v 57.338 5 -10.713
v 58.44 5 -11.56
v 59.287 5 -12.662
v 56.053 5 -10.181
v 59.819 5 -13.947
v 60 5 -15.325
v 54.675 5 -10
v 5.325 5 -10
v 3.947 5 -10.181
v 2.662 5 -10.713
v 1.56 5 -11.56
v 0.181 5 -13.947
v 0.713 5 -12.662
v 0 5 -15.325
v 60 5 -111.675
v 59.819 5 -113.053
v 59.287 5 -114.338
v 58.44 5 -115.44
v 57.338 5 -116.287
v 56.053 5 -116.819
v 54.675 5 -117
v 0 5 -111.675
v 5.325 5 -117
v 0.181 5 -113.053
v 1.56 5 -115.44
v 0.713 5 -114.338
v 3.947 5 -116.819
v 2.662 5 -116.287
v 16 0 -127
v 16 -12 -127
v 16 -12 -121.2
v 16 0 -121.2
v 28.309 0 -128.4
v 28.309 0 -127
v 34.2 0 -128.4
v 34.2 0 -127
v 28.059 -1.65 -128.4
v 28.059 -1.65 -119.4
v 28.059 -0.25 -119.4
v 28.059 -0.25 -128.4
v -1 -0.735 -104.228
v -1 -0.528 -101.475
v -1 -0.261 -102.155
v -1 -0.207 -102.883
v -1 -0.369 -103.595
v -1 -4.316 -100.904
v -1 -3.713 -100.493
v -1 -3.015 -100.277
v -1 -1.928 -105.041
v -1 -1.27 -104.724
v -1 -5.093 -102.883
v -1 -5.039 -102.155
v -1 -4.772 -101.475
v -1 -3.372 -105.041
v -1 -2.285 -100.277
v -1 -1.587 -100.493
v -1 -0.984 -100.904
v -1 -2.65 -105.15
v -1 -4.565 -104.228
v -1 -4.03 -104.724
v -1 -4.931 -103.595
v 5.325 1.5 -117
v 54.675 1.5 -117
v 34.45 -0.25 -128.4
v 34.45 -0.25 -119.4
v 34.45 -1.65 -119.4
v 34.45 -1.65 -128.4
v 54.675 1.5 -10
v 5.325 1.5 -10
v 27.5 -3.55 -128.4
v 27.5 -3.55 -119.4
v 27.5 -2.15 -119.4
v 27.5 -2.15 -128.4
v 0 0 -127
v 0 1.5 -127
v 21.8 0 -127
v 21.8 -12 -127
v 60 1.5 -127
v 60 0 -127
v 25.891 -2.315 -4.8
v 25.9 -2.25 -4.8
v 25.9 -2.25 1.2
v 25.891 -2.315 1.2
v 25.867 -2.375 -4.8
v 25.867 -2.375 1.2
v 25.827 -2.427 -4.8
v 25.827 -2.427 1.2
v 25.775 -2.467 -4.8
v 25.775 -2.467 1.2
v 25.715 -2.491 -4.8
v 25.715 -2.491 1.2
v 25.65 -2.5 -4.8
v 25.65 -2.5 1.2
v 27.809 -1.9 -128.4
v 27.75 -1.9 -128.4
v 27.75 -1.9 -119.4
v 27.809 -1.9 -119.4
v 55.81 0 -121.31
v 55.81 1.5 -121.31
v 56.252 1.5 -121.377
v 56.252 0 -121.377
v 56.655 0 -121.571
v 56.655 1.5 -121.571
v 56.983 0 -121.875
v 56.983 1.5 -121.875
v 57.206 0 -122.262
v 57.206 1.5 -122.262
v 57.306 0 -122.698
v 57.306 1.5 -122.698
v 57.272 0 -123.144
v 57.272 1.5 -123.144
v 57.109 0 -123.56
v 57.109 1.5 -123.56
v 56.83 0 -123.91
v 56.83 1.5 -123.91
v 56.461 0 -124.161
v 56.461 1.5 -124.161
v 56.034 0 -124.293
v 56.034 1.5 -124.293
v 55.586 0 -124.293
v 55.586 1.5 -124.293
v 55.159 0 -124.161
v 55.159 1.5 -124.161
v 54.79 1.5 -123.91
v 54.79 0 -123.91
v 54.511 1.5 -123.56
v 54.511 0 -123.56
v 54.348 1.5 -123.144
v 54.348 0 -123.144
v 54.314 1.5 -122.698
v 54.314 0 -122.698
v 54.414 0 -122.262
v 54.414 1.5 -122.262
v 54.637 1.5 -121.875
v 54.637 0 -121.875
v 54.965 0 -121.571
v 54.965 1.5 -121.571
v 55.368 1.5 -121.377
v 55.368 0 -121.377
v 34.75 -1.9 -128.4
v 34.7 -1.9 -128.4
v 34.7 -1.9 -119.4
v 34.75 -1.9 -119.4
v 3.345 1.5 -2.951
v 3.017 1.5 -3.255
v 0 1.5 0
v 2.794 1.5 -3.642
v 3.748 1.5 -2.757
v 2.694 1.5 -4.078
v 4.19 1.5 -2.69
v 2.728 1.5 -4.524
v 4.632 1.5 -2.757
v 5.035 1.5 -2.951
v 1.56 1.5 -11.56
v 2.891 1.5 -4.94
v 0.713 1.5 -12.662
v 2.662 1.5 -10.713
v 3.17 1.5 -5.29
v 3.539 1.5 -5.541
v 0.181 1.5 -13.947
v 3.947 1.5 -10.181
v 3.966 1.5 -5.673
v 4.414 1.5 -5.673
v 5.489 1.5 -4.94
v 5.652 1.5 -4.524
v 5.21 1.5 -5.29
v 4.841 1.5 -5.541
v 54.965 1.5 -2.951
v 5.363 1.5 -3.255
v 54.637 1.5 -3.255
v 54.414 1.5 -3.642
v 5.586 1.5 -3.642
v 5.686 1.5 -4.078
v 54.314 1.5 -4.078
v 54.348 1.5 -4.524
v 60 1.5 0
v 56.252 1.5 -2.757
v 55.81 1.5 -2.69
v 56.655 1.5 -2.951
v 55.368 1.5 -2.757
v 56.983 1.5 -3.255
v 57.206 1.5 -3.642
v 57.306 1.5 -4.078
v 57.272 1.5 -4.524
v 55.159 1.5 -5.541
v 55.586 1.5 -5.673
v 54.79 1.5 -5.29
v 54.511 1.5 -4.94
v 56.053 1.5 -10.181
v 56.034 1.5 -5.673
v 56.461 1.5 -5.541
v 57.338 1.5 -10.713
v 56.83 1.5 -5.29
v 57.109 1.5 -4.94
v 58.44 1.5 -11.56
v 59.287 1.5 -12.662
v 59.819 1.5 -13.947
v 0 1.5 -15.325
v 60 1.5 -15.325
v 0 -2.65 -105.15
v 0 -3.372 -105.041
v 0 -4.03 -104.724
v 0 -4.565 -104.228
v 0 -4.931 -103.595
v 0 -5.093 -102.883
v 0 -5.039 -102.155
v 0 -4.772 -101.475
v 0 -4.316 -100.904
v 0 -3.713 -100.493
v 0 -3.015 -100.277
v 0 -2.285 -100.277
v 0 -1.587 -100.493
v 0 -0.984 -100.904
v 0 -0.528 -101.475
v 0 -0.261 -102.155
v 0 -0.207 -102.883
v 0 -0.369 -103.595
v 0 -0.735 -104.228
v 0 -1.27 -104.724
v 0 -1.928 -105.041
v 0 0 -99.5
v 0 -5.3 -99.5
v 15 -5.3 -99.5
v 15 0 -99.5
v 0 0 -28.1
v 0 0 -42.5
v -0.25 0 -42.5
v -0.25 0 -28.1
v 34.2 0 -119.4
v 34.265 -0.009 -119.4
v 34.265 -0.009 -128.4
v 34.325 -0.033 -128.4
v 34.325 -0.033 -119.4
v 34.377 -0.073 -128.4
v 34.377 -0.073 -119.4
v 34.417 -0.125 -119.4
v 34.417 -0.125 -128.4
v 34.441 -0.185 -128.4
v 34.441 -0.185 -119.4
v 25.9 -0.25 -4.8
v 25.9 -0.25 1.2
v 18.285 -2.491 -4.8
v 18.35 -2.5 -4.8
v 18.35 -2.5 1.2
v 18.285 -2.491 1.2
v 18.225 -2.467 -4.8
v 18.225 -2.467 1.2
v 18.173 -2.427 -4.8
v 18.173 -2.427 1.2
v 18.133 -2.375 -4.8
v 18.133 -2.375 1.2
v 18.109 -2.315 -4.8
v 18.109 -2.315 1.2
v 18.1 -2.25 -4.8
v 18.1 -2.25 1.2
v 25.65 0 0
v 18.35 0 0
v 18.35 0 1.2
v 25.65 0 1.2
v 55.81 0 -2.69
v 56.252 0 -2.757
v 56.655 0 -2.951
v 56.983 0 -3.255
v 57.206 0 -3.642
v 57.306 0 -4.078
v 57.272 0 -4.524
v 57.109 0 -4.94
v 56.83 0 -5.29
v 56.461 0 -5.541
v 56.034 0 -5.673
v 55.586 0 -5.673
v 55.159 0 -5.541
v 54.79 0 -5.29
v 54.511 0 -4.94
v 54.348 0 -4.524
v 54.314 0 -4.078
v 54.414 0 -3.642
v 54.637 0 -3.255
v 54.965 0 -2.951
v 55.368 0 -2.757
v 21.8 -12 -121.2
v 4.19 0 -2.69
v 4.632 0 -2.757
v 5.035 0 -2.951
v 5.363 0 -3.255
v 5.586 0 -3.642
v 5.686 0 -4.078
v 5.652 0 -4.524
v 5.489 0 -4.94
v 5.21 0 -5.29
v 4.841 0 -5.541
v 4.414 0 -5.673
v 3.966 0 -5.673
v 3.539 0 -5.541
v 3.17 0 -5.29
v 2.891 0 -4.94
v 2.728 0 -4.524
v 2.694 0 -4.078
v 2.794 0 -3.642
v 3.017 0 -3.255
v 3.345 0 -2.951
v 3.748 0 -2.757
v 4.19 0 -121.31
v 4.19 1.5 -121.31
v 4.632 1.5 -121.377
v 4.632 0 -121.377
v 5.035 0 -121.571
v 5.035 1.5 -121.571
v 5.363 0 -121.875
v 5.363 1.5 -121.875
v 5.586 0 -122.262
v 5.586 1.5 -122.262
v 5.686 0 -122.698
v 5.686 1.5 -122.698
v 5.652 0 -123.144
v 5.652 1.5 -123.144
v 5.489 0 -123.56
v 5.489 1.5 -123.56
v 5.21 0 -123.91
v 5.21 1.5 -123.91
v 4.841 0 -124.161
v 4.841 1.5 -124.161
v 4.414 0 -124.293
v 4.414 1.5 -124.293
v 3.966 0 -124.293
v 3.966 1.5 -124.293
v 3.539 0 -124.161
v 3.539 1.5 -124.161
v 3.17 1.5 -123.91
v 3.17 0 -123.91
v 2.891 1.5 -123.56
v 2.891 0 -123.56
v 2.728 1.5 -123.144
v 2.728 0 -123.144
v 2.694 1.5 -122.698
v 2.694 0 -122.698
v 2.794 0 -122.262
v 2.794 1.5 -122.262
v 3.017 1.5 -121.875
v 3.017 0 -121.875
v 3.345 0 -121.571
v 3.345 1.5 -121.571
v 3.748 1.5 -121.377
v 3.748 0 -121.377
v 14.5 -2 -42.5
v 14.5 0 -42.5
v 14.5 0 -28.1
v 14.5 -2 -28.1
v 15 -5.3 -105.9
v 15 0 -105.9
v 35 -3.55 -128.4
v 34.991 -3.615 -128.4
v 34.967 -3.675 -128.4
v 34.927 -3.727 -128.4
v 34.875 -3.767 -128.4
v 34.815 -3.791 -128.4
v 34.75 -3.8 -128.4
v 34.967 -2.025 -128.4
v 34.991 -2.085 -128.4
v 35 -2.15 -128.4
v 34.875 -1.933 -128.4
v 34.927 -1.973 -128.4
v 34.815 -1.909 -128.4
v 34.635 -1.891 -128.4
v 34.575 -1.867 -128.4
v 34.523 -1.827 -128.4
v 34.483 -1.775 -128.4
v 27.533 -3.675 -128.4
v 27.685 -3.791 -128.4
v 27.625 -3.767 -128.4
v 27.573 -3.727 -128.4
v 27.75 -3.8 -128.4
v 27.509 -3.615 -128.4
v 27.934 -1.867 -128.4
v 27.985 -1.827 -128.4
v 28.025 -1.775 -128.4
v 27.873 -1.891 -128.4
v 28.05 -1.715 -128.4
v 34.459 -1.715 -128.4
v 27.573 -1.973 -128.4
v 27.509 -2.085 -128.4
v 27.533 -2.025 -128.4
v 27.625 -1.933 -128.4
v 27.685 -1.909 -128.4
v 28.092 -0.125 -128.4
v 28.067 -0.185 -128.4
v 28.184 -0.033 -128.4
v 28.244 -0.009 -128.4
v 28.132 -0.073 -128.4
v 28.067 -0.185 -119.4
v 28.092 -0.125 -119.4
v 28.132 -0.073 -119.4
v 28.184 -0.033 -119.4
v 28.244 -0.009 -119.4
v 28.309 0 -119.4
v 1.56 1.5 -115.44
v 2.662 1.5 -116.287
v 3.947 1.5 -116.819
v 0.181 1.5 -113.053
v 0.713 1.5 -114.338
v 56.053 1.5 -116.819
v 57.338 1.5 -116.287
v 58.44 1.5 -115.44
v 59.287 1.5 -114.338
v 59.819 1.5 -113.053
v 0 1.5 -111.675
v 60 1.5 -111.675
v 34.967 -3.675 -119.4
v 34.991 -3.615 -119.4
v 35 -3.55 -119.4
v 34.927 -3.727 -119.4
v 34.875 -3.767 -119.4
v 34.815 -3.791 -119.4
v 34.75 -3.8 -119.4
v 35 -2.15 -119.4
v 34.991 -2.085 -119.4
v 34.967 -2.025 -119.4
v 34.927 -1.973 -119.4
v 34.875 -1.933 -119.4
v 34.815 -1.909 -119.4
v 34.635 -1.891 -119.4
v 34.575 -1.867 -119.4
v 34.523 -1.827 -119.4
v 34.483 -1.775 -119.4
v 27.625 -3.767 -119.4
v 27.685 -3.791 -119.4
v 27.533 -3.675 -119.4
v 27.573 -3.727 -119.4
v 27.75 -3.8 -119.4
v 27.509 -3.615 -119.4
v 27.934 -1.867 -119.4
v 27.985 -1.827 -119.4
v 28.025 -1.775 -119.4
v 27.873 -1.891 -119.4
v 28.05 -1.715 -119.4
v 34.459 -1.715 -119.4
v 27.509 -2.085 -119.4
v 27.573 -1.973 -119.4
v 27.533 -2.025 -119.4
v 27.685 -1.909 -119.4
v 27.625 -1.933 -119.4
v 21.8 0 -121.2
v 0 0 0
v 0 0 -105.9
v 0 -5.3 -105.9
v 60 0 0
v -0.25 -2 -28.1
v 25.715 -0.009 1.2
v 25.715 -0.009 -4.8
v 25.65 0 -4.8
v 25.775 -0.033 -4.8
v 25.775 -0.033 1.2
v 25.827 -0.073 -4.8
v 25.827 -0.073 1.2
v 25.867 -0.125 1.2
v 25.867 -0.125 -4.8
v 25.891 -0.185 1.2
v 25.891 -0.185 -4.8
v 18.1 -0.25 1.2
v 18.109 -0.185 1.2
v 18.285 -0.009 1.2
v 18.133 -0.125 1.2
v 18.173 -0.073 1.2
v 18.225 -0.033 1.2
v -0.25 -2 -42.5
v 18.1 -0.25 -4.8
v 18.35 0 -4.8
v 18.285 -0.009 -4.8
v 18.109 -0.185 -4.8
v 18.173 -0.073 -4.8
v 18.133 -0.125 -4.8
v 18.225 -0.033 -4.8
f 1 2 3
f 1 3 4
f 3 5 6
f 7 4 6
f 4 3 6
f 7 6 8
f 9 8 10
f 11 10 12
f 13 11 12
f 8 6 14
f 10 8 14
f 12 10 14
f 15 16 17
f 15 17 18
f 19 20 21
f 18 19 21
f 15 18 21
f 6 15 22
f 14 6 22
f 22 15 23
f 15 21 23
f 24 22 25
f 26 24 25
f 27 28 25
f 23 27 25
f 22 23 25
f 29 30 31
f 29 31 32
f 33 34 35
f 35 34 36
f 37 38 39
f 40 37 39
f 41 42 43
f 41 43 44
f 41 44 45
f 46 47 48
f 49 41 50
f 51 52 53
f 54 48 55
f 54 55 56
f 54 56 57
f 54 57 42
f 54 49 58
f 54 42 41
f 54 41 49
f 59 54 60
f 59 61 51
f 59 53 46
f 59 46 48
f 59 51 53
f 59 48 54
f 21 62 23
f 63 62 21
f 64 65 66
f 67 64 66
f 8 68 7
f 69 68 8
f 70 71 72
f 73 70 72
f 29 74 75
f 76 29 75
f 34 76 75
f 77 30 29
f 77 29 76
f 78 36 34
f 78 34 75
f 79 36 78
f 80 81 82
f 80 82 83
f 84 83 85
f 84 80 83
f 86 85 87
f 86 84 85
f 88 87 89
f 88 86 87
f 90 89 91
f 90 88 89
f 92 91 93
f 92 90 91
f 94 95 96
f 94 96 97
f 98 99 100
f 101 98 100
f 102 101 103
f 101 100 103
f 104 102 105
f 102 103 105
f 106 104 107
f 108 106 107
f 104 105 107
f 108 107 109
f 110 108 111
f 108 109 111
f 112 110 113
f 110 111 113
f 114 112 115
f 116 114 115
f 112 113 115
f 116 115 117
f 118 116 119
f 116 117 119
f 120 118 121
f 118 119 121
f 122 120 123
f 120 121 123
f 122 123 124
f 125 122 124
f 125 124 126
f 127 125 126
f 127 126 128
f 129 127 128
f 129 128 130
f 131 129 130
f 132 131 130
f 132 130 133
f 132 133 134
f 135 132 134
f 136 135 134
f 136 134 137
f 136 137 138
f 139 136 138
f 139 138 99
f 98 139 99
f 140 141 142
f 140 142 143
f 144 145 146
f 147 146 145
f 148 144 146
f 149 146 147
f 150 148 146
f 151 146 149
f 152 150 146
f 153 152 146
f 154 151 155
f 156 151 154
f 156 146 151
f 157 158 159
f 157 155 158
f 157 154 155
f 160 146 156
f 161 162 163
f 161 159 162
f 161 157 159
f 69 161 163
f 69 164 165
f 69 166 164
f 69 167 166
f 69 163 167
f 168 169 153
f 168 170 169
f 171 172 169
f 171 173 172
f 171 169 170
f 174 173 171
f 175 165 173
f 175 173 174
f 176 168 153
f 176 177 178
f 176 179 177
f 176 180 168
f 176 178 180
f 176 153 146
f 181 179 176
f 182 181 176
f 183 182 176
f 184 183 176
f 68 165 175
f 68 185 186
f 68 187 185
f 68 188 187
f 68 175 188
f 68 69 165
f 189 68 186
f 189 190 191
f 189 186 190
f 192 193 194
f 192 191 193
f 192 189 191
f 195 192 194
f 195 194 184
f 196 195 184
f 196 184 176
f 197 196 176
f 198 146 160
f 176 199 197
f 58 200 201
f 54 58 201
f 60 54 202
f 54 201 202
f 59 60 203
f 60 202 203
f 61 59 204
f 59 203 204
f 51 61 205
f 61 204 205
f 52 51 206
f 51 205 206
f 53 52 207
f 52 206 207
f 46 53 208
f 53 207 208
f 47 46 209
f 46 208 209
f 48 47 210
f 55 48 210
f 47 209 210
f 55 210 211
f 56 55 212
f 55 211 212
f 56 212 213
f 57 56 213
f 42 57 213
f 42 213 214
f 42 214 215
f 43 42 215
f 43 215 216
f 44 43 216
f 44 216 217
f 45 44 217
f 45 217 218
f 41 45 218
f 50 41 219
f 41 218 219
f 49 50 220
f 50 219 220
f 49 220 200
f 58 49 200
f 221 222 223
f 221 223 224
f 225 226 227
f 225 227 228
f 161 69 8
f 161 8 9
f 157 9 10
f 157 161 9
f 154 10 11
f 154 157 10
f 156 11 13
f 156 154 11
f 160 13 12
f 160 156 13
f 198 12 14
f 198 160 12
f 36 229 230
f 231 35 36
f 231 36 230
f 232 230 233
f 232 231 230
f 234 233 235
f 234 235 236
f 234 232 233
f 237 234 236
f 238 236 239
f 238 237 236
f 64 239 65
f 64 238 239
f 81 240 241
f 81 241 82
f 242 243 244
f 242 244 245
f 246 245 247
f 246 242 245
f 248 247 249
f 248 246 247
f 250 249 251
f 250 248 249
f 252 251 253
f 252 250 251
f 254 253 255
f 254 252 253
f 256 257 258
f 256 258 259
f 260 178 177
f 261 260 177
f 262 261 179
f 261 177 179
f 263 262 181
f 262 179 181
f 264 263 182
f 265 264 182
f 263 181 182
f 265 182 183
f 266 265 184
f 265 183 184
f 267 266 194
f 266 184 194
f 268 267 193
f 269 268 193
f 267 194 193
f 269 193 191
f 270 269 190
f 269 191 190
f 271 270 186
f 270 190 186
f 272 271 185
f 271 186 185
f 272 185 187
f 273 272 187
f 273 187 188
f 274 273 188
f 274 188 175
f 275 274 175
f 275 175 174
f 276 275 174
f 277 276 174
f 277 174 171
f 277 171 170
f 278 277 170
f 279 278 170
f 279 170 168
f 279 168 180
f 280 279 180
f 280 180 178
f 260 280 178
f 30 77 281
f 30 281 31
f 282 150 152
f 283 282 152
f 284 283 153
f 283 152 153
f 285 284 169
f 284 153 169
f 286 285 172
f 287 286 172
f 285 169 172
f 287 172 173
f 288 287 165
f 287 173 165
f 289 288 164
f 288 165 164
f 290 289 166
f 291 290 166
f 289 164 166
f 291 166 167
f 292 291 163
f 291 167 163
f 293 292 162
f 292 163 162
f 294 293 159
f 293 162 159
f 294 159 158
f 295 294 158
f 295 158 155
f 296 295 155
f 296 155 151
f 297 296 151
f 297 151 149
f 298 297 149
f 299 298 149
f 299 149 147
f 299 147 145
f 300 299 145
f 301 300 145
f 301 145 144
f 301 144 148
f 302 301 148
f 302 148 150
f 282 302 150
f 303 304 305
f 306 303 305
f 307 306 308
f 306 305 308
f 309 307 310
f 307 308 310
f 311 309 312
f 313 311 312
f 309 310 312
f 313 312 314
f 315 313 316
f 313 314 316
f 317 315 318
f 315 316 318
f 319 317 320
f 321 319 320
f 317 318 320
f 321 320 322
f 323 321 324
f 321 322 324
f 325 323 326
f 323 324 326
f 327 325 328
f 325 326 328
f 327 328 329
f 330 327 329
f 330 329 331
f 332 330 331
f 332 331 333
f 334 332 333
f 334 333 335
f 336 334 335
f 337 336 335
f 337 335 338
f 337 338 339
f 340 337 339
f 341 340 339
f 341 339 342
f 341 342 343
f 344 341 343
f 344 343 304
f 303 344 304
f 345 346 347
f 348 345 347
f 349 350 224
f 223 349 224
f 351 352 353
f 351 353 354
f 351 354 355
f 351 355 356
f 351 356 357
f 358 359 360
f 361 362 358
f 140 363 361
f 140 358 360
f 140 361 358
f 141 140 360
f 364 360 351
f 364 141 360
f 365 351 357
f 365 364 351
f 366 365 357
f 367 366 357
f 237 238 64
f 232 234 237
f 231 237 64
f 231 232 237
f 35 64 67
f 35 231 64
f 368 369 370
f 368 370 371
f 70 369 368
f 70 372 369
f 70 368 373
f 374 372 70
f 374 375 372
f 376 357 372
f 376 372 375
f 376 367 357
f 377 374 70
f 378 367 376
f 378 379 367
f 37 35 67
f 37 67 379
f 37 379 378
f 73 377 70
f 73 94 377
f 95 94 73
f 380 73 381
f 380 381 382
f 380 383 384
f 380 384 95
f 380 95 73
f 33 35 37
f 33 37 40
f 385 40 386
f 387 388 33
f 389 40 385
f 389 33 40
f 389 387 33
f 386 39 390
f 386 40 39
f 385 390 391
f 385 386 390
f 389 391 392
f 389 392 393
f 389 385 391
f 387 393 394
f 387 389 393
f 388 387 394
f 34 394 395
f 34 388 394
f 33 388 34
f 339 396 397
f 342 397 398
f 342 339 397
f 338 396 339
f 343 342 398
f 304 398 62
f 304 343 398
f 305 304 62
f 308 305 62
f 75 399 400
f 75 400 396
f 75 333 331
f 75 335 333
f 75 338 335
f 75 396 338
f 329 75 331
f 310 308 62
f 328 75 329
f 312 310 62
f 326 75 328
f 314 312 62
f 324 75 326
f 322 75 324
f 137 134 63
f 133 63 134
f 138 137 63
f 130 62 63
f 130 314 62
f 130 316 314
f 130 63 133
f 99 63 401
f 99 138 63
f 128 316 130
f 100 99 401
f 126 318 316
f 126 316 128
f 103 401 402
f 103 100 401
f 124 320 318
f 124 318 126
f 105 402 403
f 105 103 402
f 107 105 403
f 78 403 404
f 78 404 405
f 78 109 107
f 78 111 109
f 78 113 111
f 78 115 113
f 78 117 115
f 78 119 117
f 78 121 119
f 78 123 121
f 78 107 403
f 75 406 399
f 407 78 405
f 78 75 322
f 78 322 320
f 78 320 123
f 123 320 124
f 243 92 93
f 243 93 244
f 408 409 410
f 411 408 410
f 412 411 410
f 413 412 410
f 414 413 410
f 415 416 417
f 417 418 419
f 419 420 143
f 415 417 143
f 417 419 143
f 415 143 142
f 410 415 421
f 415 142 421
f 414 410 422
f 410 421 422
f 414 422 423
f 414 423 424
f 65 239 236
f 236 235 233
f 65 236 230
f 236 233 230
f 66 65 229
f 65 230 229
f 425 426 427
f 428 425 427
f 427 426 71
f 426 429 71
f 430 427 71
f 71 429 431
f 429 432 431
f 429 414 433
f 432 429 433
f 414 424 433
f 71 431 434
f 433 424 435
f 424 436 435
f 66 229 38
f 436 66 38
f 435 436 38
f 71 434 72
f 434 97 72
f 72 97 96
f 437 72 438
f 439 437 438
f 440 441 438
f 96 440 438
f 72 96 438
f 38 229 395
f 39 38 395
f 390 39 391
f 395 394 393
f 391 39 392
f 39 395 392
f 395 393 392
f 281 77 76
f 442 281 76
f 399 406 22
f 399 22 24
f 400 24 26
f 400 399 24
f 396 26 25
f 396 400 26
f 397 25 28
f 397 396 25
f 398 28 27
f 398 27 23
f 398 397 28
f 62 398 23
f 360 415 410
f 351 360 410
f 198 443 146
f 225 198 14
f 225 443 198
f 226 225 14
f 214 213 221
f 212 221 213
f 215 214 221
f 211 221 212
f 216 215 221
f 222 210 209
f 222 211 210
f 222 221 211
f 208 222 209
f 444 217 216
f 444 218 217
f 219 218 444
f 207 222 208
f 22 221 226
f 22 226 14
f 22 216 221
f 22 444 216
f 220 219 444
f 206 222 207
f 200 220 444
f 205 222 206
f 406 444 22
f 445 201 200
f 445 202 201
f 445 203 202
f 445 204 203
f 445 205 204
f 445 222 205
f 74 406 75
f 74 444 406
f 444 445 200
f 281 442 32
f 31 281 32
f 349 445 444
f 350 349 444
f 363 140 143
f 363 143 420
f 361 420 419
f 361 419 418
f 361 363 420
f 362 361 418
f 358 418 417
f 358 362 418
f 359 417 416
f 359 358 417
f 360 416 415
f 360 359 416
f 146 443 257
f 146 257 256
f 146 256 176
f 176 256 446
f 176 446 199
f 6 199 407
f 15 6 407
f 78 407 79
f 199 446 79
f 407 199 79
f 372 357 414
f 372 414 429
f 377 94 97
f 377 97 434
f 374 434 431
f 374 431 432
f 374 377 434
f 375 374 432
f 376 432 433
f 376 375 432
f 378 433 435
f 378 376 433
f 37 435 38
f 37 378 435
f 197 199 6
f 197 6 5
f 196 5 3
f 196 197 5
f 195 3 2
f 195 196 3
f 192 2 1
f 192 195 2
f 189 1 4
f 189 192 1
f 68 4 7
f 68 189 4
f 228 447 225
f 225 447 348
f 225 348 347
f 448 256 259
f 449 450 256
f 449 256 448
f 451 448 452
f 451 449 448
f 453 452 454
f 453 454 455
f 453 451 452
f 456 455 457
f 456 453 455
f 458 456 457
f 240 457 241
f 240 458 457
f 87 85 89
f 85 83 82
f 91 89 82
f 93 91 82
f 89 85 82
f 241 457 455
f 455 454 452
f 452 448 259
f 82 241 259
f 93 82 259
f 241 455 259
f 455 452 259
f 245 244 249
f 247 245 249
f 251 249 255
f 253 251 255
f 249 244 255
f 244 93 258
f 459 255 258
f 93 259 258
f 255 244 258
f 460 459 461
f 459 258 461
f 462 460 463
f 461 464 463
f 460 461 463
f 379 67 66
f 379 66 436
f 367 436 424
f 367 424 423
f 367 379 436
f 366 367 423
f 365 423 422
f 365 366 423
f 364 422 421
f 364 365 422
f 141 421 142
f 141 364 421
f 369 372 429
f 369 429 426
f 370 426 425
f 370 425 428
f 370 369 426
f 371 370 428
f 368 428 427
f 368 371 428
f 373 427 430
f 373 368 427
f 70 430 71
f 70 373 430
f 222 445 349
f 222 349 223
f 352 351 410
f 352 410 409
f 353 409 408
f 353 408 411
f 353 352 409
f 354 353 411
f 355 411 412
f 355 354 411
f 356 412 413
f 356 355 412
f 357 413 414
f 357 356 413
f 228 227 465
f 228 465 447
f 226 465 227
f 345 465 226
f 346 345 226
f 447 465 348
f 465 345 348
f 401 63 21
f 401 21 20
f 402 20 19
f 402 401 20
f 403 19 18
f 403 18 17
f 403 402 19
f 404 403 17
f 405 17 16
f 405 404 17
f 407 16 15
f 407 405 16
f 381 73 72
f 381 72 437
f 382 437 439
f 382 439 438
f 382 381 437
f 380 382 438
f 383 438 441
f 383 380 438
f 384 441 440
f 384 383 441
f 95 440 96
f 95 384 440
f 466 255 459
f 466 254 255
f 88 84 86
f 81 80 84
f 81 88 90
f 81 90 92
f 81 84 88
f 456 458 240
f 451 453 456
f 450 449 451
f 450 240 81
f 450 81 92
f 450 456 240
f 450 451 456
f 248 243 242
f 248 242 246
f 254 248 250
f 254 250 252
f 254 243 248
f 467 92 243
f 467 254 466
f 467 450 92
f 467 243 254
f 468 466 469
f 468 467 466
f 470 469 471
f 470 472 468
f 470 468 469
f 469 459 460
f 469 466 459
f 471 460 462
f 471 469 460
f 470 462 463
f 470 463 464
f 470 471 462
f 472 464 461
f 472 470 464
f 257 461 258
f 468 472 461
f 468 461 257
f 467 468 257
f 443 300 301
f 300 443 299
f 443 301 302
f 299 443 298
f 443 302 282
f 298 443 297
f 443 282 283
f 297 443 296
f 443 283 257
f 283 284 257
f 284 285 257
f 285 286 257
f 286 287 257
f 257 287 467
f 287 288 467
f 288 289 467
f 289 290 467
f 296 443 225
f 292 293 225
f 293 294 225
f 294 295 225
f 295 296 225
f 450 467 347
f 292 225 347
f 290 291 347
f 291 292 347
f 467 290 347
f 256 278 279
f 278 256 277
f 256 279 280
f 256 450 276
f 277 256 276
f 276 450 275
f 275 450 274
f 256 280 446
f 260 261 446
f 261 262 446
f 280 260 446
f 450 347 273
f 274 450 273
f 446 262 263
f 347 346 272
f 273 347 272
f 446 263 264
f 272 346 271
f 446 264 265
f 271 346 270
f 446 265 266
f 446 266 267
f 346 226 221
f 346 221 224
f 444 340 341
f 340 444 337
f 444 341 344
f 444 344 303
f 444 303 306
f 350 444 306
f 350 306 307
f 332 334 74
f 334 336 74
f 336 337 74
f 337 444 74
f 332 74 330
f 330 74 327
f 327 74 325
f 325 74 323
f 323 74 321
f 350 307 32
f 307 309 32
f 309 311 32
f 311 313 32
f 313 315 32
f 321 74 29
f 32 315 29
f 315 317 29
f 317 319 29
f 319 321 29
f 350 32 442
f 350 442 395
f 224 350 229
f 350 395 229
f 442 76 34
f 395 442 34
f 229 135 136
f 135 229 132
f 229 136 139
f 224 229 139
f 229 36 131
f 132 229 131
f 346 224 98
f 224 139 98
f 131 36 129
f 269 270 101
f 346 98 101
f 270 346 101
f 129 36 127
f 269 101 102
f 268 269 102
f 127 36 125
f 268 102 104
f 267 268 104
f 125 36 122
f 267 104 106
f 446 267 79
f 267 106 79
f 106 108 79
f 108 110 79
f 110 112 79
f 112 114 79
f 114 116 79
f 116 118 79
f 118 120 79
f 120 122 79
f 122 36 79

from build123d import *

# Parameters (mm, degrees)
SKETCH1_W            = 60
SKETCH1_H            = 127
BOSS_EXTRUDE1_DEPTH  = 1.5
CUT_EXTRUDE1_REACH   = 142.468
SKETCH2_R            = 1.5
BOSS_EXTRUDE2_DEPTH  = 3.5
BOSS_EXTRUDE3_DEPTH  = 4.8
BOSS_EXTRUDE4_DEPTH  = 1.2
SKETCH5_W            = 14.4
SKETCH5_H            = 2
BOSS_EXTRUDE5_DEPTH  = 14.5
BOSS_EXTRUDE6_DEPTH  = 1.4
BOSS_EXTRUDE7_DEPTH  = 7.6
SKETCH7_W            = 6.4
SKETCH7_H            = 5.3
BOSS_EXTRUDE8_DEPTH  = 15
SKETCH8_R            = 2.45
BOSS_EXTRUDE9_DEPTH  = 1
SKETCH5_2_W          = 14.4
SKETCH5_2_H          = 2
BOSS_EXTRUDE10_DEPTH = 0.25
SKETCH9_W            = 5.8
SKETCH9_H            = 12
BOSS_EXTRUDE11_DEPTH = 5.8


with BuildPart() as part:
    # Sketch1 → Boss-Extrude1 (new body)
    with BuildSketch(Plane(origin=(0, 0, 0), x_dir=(1, 0, 0), z_dir=(0, 1, 0))):
        with Locations((30, 63.5)):
            Rectangle(SKETCH1_W, SKETCH1_H)
    extrude(amount=BOSS_EXTRUDE1_DEPTH)

    # Sketch2 → Cut-Extrude1 (cut, up to next)
    with BuildSketch(Plane(origin=(0, 1.5, 0), x_dir=(1, 0, 0), z_dir=(0, 1, 0)), mode=Mode.PRIVATE) as cut_extrude1_sk1:
        with Locations((4.19, 122.81)):
            Circle(SKETCH2_R)
    cut_extrude1_tool1 = extrude(cut_extrude1_sk1.sketch, amount=-CUT_EXTRUDE1_REACH, mode=Mode.PRIVATE) & part.part
    # Sketch2 → Cut-Extrude1 (cut, up to next)
    with BuildSketch(Plane(origin=(0, 1.5, 0), x_dir=(1, 0, 0), z_dir=(0, 1, 0)), mode=Mode.PRIVATE) as cut_extrude1_sk2:
        with Locations((55.81, 122.81)):
            Circle(SKETCH2_R)
    cut_extrude1_tool2 = extrude(cut_extrude1_sk2.sketch, amount=-CUT_EXTRUDE1_REACH, mode=Mode.PRIVATE) & part.part
    # Sketch2 → Cut-Extrude1 (cut, up to next)
    with BuildSketch(Plane(origin=(0, 1.5, 0), x_dir=(1, 0, 0), z_dir=(0, 1, 0)), mode=Mode.PRIVATE) as cut_extrude1_sk3:
        with Locations((4.19, 4.19)):
            Circle(SKETCH2_R)
    cut_extrude1_tool3 = extrude(cut_extrude1_sk3.sketch, amount=-CUT_EXTRUDE1_REACH, mode=Mode.PRIVATE) & part.part
    # Sketch2 → Cut-Extrude1 (cut, up to next)
    with BuildSketch(Plane(origin=(0, 1.5, 0), x_dir=(1, 0, 0), z_dir=(0, 1, 0)), mode=Mode.PRIVATE) as cut_extrude1_sk4:
        with Locations((55.81, 4.19)):
            Circle(SKETCH2_R)
    cut_extrude1_tool4 = extrude(cut_extrude1_sk4.sketch, amount=-CUT_EXTRUDE1_REACH, mode=Mode.PRIVATE) & part.part
    add(cut_extrude1_tool1.solids().sort_by_distance((4.19, 1.5, -122.81))[0], mode=Mode.SUBTRACT)
    add(cut_extrude1_tool2.solids().sort_by_distance((55.81, 1.5, -122.81))[0], mode=Mode.SUBTRACT)
    add(cut_extrude1_tool3.solids().sort_by_distance((4.19, 1.5, -4.19))[0], mode=Mode.SUBTRACT)
    add(cut_extrude1_tool4.solids().sort_by_distance((55.81, 1.5, -4.19))[0], mode=Mode.SUBTRACT)

    # Sketch3 → Boss-Extrude2 (add)
    with BuildSketch(Plane(origin=(0, 1.5, 0), x_dir=(1, 0, 0), z_dir=(0, 1, 0))):
        with BuildLine():
            Line((5.324675365, 117), (54.675324635, 117))
            ThreePointArc((54.675324635, 117), (58.440438693, 115.440438693), (60, 111.675324635))
            Line((60, 111.675324635), (60, 15.324675365))
            ThreePointArc((60, 15.324675365), (58.440438693, 11.559561307), (54.675324635, 10))
            Line((54.675324635, 10), (5.324675365, 10))
            ThreePointArc((5.324675365, 10), (1.559561307, 11.559561307), (0, 15.324675365))
            Line((0, 15.324675365), (0, 111.675324635))
            ThreePointArc((0, 111.675324635), (1.559561307, 115.440438693), (5.324675365, 117))
        make_face()
    extrude(amount=BOSS_EXTRUDE2_DEPTH)



with BuildPart() as body_2:
    # Sketch4 → Boss-Extrude3 (new body)
    with BuildSketch(Plane.XY):
        with BuildLine():
            Line((18.35, 0), (25.65, 0))
            ThreePointArc((25.65, 0), (25.826776695, -0.073223305), (25.9, -0.25))
            Line((25.9, -0.25), (25.9, -2.25))
            ThreePointArc((25.9, -2.25), (25.826776695, -2.426776695), (25.65, -2.5))
            Line((25.65, -2.5), (18.35, -2.5))
            ThreePointArc((18.35, -2.5), (18.173223305, -2.426776695), (18.1, -2.25))
            Line((18.1, -2.25), (18.1, -0.25))
            ThreePointArc((18.1, -0.25), (18.173223305, -0.073223305), (18.35, 0))
        make_face()
    extrude(amount=-BOSS_EXTRUDE3_DEPTH)


with BuildPart() as part_1:
    add(part.part)

    add(body_2.part)  # Boss-Extrude4 merges body 2
    # Sketch4<2> → Boss-Extrude4 (add)
    with BuildSketch(Plane.XY):
        with BuildLine():
            Line((18.35, 0), (25.65, 0))
            ThreePointArc((25.65, 0), (25.826776695, -0.073223305), (25.9, -0.25))
            Line((25.9, -0.25), (25.9, -2.25))
            ThreePointArc((25.9, -2.25), (25.826776695, -2.426776695), (25.65, -2.5))
            Line((25.65, -2.5), (18.35, -2.5))
            ThreePointArc((18.35, -2.5), (18.173223305, -2.426776695), (18.1, -2.25))
            Line((18.1, -2.25), (18.1, -0.25))
            ThreePointArc((18.1, -0.25), (18.173223305, -0.073223305), (18.35, 0))
        make_face()
    extrude(amount=BOSS_EXTRUDE4_DEPTH)

    # Sketch5 → Boss-Extrude5 (add)
    with BuildSketch(Plane.ZY):
        with Locations((-35.3, -1)):
            Rectangle(SKETCH5_W, SKETCH5_H)
    extrude(amount=-BOSS_EXTRUDE5_DEPTH)



with BuildPart() as body_2_2:
    # Sketch6 → Boss-Extrude6 (new body)
    with BuildSketch(Plane(origin=(0, 0, -127), x_dir=(-1, 0, 0), z_dir=(0, 0, -1))):
        with BuildLine():
            Line((-28.308670428, 0), (-34.2, 0))
            ThreePointArc((-34.2, 0), (-34.376776695, -0.073223305), (-34.45, -0.25))
            Line((-34.45, -0.25), (-34.45, -1.65))
            ThreePointArc((-34.45, -1.65), (-34.523223305, -1.826776695), (-34.7, -1.9))
            Line((-34.7, -1.9), (-34.75, -1.9))
            ThreePointArc((-34.75, -1.9), (-34.926776695, -1.973223305), (-35, -2.15))
            Line((-35, -2.15), (-35, -3.55))
            ThreePointArc((-35, -3.55), (-34.926776695, -3.726776695), (-34.75, -3.8))
            Line((-34.75, -3.8), (-27.75, -3.8))
            ThreePointArc((-27.75, -3.8), (-27.573223305, -3.726776695), (-27.5, -3.55))
            Line((-27.5, -3.55), (-27.5, -2.15))
            ThreePointArc((-27.5, -2.15), (-27.573223305, -1.973223305), (-27.75, -1.9))
            Line((-27.75, -1.9), (-27.808670428, -1.9))
            ThreePointArc((-27.808670428, -1.9), (-27.985447123, -1.826776695), (-28.058670428, -1.65))
            Line((-28.058670428, -1.65), (-28.058670428, -0.25))
            ThreePointArc((-28.058670428, -0.25), (-28.131893732, -0.073223305), (-28.308670428, 0))
        make_face()
    extrude(amount=BOSS_EXTRUDE6_DEPTH)


with BuildPart() as part_2:
    add(part_1.part)

    add(body_2_2.part)  # Boss-Extrude7 merges body 2 2
    # Sketch6<3> → Boss-Extrude7 (add)
    with BuildSketch(Plane(origin=(0, 0, -127), x_dir=(-1, 0, 0), z_dir=(0, 0, -1))):
        with BuildLine():
            Line((-28.308670428, 0), (-34.2, 0))
            ThreePointArc((-34.2, 0), (-34.376776695, -0.073223305), (-34.45, -0.25))
            Line((-34.45, -0.25), (-34.45, -1.65))
            ThreePointArc((-34.45, -1.65), (-34.523223305, -1.826776695), (-34.7, -1.9))
            Line((-34.7, -1.9), (-34.75, -1.9))
            ThreePointArc((-34.75, -1.9), (-34.926776695, -1.973223305), (-35, -2.15))
            Line((-35, -2.15), (-35, -3.55))
            ThreePointArc((-35, -3.55), (-34.926776695, -3.726776695), (-34.75, -3.8))
            Line((-34.75, -3.8), (-27.75, -3.8))
            ThreePointArc((-27.75, -3.8), (-27.573223305, -3.726776695), (-27.5, -3.55))
            Line((-27.5, -3.55), (-27.5, -2.15))
            ThreePointArc((-27.5, -2.15), (-27.573223305, -1.973223305), (-27.75, -1.9))
            Line((-27.75, -1.9), (-27.808670428, -1.9))
            ThreePointArc((-27.808670428, -1.9), (-27.985447123, -1.826776695), (-28.058670428, -1.65))
            Line((-28.058670428, -1.65), (-28.058670428, -0.25))
            ThreePointArc((-28.058670428, -0.25), (-28.131893732, -0.073223305), (-28.308670428, 0))
        make_face()
    extrude(amount=-BOSS_EXTRUDE7_DEPTH)

    # Sketch7 → Boss-Extrude8 (add)
    with BuildSketch(Plane.ZY):
        with Locations((-102.7, -2.65)):
            Rectangle(SKETCH7_W, SKETCH7_H)
    extrude(amount=-BOSS_EXTRUDE8_DEPTH)

    # Sketch8 → Boss-Extrude9 (add)
    with BuildSketch(Plane.ZY):
        with Locations((-102.7, -2.65)):
            Circle(SKETCH8_R)
    extrude(amount=BOSS_EXTRUDE9_DEPTH)

    # Sketch5<2> → Boss-Extrude10 (add)
    with BuildSketch(Plane.ZY):
        with Locations((-35.3, -1)):
            Rectangle(SKETCH5_2_W, SKETCH5_2_H)
    extrude(amount=BOSS_EXTRUDE10_DEPTH)

    # Sketch9 → Boss-Extrude11 (add)
    with BuildSketch(Plane(origin=(0, 0, -127), x_dir=(-1, 0, 0), z_dir=(0, 0, -1))):
        with Locations((-18.9, -6)):
            Rectangle(SKETCH9_W, SKETCH9_H)
    extrude(amount=-BOSS_EXTRUDE11_DEPTH)


solid = part_2.part
